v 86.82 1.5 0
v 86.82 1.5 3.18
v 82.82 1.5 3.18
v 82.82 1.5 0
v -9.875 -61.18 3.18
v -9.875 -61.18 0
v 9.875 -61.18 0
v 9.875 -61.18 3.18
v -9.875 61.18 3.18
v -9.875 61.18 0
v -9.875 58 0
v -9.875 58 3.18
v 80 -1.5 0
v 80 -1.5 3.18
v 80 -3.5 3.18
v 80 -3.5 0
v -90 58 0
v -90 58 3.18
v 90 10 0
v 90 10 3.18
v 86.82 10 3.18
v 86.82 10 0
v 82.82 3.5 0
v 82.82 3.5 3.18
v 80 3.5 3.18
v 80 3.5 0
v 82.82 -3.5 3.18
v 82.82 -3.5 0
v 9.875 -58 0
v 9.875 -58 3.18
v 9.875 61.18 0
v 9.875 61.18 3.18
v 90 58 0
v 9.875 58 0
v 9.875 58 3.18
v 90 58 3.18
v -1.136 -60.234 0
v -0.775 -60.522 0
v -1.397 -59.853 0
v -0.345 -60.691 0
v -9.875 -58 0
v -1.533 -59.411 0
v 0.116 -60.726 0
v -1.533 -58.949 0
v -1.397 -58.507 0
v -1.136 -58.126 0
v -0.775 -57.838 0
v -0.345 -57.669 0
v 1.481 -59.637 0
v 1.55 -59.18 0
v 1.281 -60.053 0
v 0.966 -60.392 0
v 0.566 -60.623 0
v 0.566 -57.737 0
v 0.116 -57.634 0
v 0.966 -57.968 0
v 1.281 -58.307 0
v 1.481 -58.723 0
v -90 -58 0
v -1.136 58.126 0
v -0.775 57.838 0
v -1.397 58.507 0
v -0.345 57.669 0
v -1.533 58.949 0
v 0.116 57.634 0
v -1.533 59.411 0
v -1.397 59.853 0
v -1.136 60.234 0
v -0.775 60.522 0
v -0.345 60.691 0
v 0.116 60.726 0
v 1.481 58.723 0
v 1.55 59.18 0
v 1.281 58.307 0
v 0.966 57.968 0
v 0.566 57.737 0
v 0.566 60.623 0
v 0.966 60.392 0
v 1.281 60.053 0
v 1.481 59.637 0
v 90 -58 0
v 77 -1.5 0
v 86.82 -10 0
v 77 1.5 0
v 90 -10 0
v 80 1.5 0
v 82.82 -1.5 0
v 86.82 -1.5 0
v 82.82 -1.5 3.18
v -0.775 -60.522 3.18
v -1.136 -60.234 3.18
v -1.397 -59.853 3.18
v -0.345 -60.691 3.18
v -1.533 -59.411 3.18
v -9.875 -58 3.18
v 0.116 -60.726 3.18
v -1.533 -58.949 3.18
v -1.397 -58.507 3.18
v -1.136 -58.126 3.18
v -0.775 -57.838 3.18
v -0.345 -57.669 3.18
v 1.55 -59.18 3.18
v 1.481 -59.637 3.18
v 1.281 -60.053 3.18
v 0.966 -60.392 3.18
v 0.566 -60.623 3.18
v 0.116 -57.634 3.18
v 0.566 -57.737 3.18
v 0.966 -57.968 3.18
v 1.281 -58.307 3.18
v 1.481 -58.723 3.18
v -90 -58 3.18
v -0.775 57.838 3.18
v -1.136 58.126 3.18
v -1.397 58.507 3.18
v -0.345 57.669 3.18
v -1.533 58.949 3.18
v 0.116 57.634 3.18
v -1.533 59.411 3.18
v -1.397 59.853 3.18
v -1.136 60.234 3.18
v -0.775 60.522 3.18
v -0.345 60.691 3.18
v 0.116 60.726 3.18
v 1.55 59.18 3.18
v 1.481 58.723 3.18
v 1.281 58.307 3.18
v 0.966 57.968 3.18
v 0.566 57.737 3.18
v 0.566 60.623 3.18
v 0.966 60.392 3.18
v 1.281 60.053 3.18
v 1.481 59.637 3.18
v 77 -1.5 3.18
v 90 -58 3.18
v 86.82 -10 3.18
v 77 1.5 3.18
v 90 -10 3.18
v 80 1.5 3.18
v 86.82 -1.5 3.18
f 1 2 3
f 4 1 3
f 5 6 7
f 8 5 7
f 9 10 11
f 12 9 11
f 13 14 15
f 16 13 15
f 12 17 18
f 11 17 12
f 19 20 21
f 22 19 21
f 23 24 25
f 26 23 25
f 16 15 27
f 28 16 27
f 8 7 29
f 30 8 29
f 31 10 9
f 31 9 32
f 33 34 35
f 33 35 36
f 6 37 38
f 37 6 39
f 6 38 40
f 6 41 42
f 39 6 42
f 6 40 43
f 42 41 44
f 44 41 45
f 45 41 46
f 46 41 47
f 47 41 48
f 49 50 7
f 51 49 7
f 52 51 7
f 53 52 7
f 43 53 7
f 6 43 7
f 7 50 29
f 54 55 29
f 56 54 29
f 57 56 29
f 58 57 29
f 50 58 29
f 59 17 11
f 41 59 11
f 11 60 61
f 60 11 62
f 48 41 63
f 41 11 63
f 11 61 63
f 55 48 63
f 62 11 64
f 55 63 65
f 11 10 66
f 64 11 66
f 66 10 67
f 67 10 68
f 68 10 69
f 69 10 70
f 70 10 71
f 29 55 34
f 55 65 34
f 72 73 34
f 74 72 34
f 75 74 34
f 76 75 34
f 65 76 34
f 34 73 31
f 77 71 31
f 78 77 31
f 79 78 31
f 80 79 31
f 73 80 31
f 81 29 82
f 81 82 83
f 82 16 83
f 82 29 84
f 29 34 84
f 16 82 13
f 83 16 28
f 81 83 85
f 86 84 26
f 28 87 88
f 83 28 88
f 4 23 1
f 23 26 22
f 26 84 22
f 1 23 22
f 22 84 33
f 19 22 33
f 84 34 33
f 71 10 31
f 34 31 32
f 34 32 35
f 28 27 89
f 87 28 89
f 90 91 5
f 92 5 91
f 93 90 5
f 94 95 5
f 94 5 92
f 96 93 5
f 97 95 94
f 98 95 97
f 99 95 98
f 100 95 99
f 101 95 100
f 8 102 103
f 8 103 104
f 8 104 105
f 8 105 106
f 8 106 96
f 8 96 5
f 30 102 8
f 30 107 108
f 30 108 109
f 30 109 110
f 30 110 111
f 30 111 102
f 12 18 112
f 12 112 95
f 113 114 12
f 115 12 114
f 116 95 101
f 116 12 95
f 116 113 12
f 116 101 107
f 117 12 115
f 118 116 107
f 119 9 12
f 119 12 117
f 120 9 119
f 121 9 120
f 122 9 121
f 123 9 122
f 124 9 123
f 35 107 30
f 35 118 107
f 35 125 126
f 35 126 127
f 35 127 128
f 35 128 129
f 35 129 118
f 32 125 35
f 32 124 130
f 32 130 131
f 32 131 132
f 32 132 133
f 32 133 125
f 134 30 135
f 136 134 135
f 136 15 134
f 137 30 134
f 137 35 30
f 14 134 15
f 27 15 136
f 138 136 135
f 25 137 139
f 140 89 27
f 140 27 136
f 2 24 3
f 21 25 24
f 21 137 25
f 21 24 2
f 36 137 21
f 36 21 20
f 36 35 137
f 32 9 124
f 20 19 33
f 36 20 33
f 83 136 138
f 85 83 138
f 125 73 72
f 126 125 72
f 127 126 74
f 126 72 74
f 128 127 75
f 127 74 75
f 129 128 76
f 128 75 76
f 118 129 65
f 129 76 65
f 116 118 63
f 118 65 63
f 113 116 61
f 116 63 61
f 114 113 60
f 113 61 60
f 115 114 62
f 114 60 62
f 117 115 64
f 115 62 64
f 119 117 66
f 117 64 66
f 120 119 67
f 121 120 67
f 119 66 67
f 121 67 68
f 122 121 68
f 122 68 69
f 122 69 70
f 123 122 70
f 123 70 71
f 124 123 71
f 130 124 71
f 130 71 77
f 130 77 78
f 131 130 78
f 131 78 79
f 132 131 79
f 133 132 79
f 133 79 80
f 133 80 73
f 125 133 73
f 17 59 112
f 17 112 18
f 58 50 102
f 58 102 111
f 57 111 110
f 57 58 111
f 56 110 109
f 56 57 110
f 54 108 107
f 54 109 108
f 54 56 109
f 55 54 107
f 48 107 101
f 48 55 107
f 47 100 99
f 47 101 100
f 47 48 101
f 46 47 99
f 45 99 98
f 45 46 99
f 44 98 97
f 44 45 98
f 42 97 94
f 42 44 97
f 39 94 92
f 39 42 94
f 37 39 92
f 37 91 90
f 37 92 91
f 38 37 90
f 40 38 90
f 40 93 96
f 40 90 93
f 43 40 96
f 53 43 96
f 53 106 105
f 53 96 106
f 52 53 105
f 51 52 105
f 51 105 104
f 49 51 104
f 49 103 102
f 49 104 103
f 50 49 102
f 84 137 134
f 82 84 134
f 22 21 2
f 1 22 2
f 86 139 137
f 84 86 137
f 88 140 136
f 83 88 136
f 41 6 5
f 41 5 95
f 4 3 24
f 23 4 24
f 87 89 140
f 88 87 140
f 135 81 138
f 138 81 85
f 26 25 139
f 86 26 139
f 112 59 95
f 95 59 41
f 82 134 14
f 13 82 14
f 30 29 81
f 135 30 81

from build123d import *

# Parameters (mm, degrees)
SKETCH1_W               = 180
SKETCH1_H               = 122.36
BOSS_EXTRUDE1_DEPTH     = 3.18
CUT_EXTRUDE1_DEPTH      = 1
CUT_EXTRUDE1_DEPTH_BACK = 4.18
CUT_EXTRUDE2_START      = -4.18
SKETCH3_W               = 80.125
SKETCH3_H               = 3.18
CUT_EXTRUDE2_DEPTH      = 5.18
CUT_EXTRUDE3_START      = -4.18
SKETCH4_R               = 1.55
CUT_EXTRUDE3_DEPTH      = 5.18


with BuildPart() as part:
    # Sketch1 → Boss-Extrude1 (new body)
    with BuildSketch(Plane.XY):
        Rectangle(SKETCH1_W, SKETCH1_H)
    extrude(amount=BOSS_EXTRUDE1_DEPTH)

    # Sketch2 → Cut-Extrude1 (cut, two sides)
    with BuildSketch(Plane.XY.offset(3.18)) as cut_extrude1_sk:
        Polygon((80, 1.5), (77, 1.5), (77, -1.5), (80, -1.5), (80, -3.5), (82.82, -3.5), (82.82, -1.5), (86.82, -1.5), (86.82, -10), (90, -10), (90, 10), (86.82, 10), (86.82, 1.5), (82.82, 1.5), (82.82, 3.5), (80, 3.5), align=None)
    extrude(amount=CUT_EXTRUDE1_DEPTH, mode=Mode.SUBTRACT)
    extrude(cut_extrude1_sk.sketch, amount=-CUT_EXTRUDE1_DEPTH_BACK, mode=Mode.SUBTRACT)

    # Sketch3 → Cut-Extrude2 (cut)
    with BuildSketch(Plane.XY.offset(3.18).offset(CUT_EXTRUDE2_START)):
        with Locations((-49.9375, -59.59)):
            Rectangle(SKETCH3_W, SKETCH3_H)
        with Locations((49.9375, -59.59)):
            Rectangle(SKETCH3_W, SKETCH3_H)
    cut_extrude2 = extrude(amount=CUT_EXTRUDE2_DEPTH, mode=Mode.SUBTRACT)

    # Mirror1: Cut-Extrude2 across plane
    add(cut_extrude2.mirror(Plane.ZX), mode=Mode.SUBTRACT)

    # Sketch4 → Cut-Extrude3 (cut)
    with BuildSketch(Plane.XY.offset(3.18).offset(CUT_EXTRUDE3_START)):
        with Locations((0, -59.18)):
            Circle(SKETCH4_R)
    cut_extrude3 = extrude(amount=CUT_EXTRUDE3_DEPTH, mode=Mode.SUBTRACT)

    # Mirror2: Cut-Extrude3 across plane
    add(cut_extrude3.mirror(Plane.ZX), mode=Mode.SUBTRACT)


solid = part.part
